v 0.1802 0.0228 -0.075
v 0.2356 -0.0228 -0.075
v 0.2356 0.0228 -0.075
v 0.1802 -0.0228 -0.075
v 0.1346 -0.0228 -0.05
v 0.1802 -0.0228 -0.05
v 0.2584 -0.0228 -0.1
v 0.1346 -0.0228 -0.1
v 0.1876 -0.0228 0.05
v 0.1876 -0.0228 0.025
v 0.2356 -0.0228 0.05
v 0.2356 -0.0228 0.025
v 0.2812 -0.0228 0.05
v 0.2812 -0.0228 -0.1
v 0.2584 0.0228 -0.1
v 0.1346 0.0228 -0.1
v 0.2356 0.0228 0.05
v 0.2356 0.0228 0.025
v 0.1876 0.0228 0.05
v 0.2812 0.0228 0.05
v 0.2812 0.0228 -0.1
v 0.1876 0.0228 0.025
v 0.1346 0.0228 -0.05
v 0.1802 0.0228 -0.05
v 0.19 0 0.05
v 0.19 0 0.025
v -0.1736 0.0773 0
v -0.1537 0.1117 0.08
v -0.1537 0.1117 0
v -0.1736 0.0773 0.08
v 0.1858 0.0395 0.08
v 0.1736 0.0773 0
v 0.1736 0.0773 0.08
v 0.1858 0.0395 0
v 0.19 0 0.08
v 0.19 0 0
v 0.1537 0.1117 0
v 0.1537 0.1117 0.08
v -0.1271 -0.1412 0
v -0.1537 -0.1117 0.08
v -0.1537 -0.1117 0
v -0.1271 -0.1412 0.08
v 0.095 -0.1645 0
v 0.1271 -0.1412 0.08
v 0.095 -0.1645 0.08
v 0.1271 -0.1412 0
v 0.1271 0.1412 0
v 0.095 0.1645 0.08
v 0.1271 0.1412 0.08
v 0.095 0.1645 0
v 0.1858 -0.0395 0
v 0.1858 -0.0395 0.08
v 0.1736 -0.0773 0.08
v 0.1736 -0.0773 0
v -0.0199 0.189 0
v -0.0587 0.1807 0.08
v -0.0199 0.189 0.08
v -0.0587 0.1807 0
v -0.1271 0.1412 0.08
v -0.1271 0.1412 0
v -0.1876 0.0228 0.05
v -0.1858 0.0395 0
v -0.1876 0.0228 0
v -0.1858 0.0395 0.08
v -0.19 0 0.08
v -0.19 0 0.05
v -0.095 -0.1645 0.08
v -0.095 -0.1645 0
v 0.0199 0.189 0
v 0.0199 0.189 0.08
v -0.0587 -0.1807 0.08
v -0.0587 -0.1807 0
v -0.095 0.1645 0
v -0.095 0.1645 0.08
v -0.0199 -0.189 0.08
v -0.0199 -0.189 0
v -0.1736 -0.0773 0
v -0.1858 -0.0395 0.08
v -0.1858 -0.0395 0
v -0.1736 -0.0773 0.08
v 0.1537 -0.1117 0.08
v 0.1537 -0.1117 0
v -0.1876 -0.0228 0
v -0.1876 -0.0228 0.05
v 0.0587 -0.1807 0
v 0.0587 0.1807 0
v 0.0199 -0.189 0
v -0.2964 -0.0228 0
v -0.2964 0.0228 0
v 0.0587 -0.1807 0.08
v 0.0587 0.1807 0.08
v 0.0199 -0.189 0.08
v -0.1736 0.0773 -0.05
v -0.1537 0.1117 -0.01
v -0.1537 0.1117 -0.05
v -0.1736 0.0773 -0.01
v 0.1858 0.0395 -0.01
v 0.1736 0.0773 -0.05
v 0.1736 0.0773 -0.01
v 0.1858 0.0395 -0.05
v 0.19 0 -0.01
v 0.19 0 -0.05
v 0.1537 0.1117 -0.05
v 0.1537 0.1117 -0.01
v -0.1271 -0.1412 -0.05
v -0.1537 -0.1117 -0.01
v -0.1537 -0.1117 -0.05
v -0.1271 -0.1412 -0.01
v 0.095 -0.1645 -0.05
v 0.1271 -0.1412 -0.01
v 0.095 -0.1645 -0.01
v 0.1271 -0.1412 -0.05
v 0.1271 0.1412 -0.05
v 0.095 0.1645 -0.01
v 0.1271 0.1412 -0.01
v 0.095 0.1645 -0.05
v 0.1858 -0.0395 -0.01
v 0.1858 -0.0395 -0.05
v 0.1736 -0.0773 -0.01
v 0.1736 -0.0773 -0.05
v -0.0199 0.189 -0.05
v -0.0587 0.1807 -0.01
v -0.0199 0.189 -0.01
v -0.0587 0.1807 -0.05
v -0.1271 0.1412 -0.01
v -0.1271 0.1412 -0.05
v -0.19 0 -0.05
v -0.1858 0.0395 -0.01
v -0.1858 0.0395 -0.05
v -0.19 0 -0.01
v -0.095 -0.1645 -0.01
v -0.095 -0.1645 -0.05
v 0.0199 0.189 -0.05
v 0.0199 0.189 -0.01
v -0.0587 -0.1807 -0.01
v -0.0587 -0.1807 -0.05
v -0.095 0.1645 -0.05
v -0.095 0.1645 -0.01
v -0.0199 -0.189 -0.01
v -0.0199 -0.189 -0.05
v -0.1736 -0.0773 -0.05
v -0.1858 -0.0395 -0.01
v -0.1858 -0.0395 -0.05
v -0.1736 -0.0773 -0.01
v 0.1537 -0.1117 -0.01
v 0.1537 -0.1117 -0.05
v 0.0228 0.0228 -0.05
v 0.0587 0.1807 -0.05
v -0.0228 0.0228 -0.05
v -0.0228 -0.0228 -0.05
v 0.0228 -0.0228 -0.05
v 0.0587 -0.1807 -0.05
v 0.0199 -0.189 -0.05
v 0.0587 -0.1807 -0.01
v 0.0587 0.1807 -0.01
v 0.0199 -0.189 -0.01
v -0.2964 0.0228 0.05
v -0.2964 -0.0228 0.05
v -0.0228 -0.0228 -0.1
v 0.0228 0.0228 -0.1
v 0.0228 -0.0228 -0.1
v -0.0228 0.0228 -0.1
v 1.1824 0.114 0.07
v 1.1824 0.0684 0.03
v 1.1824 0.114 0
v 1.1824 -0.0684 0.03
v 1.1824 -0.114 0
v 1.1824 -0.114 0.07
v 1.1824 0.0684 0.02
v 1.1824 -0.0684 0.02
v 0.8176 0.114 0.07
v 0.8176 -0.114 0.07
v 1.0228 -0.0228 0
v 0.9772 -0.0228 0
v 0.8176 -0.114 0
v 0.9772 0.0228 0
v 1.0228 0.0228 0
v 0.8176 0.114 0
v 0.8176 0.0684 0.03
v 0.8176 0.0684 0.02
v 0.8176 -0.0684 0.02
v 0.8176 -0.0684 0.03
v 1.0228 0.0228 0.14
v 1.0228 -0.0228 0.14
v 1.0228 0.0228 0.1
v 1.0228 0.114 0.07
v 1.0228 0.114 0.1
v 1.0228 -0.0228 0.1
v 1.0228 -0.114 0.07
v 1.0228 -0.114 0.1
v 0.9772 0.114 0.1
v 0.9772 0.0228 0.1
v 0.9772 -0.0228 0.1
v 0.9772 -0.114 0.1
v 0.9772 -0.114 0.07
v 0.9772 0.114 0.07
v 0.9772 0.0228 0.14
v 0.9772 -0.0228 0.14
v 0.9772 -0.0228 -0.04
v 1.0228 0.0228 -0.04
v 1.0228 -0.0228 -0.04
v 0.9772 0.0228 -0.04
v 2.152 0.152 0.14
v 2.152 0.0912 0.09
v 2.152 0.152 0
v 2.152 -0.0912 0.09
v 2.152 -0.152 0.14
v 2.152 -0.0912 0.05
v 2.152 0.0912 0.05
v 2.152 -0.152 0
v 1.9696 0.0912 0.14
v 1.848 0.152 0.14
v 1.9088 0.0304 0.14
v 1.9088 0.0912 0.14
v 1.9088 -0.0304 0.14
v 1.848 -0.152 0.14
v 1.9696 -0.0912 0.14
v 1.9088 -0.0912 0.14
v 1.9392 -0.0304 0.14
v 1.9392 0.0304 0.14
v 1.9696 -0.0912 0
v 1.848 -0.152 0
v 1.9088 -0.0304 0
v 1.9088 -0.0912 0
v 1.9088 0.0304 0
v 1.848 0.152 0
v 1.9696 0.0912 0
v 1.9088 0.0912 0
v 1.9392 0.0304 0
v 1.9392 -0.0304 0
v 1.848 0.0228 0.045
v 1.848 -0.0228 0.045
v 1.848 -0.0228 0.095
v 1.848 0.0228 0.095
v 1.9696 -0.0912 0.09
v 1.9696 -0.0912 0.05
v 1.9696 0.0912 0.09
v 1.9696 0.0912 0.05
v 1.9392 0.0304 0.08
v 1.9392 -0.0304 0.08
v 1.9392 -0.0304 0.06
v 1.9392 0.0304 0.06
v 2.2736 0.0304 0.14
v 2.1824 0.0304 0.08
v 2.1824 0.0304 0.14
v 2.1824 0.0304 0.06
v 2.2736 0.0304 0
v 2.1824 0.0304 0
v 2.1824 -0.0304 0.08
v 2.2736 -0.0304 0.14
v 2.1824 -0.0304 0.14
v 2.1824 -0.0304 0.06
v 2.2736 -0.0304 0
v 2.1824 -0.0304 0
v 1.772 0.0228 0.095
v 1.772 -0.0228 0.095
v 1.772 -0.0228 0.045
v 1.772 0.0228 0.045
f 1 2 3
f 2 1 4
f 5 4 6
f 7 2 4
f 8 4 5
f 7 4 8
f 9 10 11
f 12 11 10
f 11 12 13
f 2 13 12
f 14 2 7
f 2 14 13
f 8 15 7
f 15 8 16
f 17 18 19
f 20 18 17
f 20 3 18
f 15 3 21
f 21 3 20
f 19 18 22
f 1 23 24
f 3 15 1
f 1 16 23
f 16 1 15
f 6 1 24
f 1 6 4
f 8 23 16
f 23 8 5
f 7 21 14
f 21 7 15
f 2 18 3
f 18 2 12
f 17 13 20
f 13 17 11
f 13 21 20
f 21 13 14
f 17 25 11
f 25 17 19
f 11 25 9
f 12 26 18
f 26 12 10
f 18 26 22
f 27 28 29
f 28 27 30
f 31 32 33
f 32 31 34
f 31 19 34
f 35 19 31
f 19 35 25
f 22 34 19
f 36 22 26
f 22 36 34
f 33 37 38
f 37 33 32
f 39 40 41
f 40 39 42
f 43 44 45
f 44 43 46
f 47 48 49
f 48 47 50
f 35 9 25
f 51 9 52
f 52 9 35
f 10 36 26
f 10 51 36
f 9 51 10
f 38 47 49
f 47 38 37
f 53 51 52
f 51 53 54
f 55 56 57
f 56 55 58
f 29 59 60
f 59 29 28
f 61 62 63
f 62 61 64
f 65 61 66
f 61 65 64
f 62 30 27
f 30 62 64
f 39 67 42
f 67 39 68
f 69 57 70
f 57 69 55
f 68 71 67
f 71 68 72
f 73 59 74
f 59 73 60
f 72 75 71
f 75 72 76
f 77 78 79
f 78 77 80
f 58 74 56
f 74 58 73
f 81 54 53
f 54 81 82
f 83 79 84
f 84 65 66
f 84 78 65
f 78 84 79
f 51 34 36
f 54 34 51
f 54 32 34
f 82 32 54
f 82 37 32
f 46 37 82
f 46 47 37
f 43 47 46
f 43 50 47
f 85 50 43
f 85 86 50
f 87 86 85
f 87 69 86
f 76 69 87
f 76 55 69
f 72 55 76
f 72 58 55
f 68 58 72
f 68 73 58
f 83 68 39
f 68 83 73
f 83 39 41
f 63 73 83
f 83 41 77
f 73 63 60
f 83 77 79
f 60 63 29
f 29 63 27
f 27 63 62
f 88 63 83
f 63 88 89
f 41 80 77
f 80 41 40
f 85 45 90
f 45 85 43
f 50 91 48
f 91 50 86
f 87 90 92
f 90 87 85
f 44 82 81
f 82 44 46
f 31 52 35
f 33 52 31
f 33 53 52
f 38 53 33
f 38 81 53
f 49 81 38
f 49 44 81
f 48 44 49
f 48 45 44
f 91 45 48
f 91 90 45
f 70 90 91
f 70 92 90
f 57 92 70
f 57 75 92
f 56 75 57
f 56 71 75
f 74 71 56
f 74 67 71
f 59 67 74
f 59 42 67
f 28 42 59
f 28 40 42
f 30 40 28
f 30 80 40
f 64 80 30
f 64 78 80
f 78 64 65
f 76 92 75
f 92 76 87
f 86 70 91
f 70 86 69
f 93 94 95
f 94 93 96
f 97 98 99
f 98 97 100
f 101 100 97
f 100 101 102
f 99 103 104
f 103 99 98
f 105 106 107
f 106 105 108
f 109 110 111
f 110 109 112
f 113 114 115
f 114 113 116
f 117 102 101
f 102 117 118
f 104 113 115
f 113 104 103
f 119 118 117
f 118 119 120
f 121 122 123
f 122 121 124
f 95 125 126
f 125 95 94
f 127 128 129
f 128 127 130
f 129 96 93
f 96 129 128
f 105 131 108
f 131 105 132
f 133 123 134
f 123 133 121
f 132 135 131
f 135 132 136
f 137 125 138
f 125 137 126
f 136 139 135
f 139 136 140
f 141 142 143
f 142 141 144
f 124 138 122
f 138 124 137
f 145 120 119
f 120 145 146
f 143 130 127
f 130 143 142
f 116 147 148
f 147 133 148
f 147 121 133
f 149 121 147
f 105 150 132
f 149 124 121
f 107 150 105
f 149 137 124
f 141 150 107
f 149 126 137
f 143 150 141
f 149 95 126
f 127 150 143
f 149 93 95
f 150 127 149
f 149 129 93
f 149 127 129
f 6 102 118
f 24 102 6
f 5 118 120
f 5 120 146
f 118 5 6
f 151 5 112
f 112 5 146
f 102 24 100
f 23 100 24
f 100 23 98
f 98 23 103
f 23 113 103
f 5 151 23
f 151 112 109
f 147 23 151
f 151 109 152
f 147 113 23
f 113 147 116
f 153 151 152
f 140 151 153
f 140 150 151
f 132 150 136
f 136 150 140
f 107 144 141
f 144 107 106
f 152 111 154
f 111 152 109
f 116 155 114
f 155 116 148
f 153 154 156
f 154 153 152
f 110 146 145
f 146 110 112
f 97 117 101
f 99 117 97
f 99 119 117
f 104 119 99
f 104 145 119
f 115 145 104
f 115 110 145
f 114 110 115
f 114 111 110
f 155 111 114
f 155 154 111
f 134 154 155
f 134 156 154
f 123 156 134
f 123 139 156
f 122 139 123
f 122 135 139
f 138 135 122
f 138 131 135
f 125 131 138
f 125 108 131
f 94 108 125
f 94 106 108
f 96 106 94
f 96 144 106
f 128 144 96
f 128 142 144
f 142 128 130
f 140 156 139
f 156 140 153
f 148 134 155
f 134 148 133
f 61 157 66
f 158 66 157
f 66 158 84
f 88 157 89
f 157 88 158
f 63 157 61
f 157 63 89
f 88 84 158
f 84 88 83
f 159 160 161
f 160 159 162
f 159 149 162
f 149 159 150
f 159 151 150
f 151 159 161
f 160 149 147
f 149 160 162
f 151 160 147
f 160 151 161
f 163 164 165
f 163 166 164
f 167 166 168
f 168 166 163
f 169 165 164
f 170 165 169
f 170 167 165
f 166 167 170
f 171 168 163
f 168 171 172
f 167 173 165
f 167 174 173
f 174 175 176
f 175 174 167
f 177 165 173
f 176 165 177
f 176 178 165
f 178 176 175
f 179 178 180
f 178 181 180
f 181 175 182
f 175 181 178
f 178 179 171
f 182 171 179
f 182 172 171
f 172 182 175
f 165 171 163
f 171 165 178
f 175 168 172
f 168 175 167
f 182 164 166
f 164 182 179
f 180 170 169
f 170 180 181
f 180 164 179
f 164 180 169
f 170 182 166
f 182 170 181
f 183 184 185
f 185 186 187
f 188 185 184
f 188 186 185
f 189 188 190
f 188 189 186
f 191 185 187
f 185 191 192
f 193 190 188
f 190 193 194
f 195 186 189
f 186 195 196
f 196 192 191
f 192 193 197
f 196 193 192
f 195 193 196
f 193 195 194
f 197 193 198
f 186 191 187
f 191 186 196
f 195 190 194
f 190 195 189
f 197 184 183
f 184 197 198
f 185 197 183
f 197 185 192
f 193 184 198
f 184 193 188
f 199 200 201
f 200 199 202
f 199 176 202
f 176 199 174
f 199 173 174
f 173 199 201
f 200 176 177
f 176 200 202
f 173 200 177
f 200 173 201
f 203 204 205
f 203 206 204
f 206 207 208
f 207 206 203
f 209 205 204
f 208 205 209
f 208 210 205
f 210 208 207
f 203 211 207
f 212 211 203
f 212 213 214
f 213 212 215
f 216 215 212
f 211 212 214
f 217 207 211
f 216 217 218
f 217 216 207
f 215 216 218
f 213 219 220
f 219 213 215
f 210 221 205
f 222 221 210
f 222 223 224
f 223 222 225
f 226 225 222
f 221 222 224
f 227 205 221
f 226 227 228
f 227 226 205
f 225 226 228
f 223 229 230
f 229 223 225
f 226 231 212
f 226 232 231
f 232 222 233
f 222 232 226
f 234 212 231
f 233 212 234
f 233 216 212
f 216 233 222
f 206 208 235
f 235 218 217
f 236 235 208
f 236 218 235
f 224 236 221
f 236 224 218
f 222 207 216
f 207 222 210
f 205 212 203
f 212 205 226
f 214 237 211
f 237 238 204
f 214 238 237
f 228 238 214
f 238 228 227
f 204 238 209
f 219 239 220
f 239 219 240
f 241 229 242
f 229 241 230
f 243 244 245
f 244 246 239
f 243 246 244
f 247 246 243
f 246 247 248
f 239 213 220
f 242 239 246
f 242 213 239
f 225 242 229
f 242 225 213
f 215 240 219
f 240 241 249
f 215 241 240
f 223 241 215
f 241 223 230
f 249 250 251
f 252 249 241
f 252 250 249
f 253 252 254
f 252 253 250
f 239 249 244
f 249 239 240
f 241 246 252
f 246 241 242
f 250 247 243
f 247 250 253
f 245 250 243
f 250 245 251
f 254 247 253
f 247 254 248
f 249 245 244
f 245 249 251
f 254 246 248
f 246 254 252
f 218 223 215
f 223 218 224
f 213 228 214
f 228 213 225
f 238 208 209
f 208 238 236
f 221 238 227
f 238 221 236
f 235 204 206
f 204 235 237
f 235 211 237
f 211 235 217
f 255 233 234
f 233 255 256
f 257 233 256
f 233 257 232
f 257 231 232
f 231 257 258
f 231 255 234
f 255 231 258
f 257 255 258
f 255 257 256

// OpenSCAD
$fa = 1;
$fs = 0.04;

layer = 0.010;
px = 0.0076;

channel_width_thick = 20 * px;
channel_height_thick = 15 * layer;
channel_width_default = 6*px;
channel_height_default = 5*layer;

module xchan(l, w = channel_width_default, h = channel_height_default) {
    color("lightblue")
    if (l < 0)
        mirror([1, 0, 0])
    translate([0, -floor(w / px / 2) * px, 0]) cube([-l, w, h]);
    else
    translate([0, -floor(w / px / 2) * px, 0]) cube([l, w, h]);
}

module ychan(l, w = channel_width_default, h = channel_height_default) {
    color("lightblue")
    if (l < 0)
        mirror([0, -1, 0])
    translate([-floor(w / px / 2) * px, 0, 0]) cube([w, -l, h]);
    else
    translate([-floor(w / px / 2) * px, 0, 0]) cube([w, l, h]);
}

module zchan(l, xy = channel_width_default) {
    color("lightblue")
    translate([-xy / 2, -xy / 2, 0]) {
        if (l < 0)
            mirror([0, 0, 1])
        cube([xy, xy, -l]);
        else
        cube([xy, xy, l]);
    }
}

module 1way_valve_membrane(
    input_channel_length=15*px,
    top_chamber_h=8*layer,
    bottom_chamber_h= 4*layer,
    membrane_diameter=50*px,
    membrane_thickness=layer,
    u_channel_length=10*px,
    u_channel_height=15*layer,
    angle_offset_u_channel=0,
    angle_offset_input_channel=0
    ){
    // Top chamber
    cylinder(h=top_chamber_h, d=membrane_diameter);

    // Bottom chamber
    translate([0, 0, -(membrane_thickness+bottom_chamber_h)])
        cylinder(h=bottom_chamber_h, d=membrane_diameter);

    // Input channel
    color("red")
    rotate([0, 0, angle_offset_input_channel])
    translate([-(input_channel_length + membrane_diameter/2) + px, 0, 0])
        xchan(input_channel_length);

    // U channel
    rotate([0, 0, angle_offset_u_channel])
    translate([membrane_diameter/2 - px, 0, channel_height_default/2]){
        xchan(u_channel_length, h=channel_height_default/2);
        translate([u_channel_length, 0, channel_height_default/2]){
            zchan(-u_channel_height);
            translate([0, 0, -u_channel_height]){
                xchan(-u_channel_length -px, h=channel_height_default/2);
                translate([-u_channel_length - channel_height_default/2, 0, 0]){
                    zchan(u_channel_height-(bottom_chamber_h + membrane_thickness + channel_height_default/2));
                }
            }
        }
    }

    // Output channel
    color("green")
    translate([0, 0, -(membrane_thickness + bottom_chamber_h)]){
        zchan(-5*layer);
    }
}

module 1way_valve_ribbon(
    membrane_width=18*px,
    membrane_thickness=layer,
    membrane_top_gap=4*layer,
    membrane_bottom_gap=2*layer,
    membrane_side_gap=6*px,
    main_chamber_x=48*px,
    inlet_x=6*px,
    inlet_z=3*layer
    ){
    main_chamber_y = membrane_width+2*membrane_side_gap;
    main_chamber_z = membrane_top_gap + membrane_thickness + membrane_bottom_gap;
    translate([-main_chamber_x/2, -main_chamber_y/2, 0]){
        difference(){
            // Main chamber
            cube([main_chamber_x, main_chamber_y, main_chamber_z]);

            // Ribbon membrane
            translate([0, membrane_side_gap, membrane_bottom_gap])
                cube([main_chamber_x, membrane_width, membrane_thickness]);
        }
        // Top thick outlet
        translate([0.5*(main_chamber_x-inlet_x), 0, main_chamber_z]){
            cube([inlet_x, main_chamber_y, inlet_z]);
            color("red")
            translate([inlet_x/2, main_chamber_y/2, inlet_z])
                zchan(4*layer);
        }
        // Bottom narrow inlet
        color("green")
        translate([main_chamber_x/2, main_chamber_y/2, 0])
            zchan(-4*layer);
    }
}

module 1way_valve_squeeze(
    length=24*px,
    height=14*layer
    ){
    ch_w = 8*px;
    ch_wtwo = 10*px;

    wall_w = 8*px;
    mem_h = layer;
    squeeze = 2*layer;
    squeezer = (height-2*mem_h-squeeze)/2;

    translate([-(length+ch_w+wall_w)/2, -(3*ch_w+2*wall_w)/2 , 0]){
        cube([length+ch_w+wall_w,ch_w,height]);
        translate([0,2*ch_w+2*wall_w])
        cube([length+ch_w+wall_w,ch_w,height]);
        translate([0,ch_w+wall_w])
        cube([ch_w+wall_w/2,ch_w,height]);
        translate([0,ch_w+wall_w,squeezer+mem_h])
        cube([length+ch_w+2.5*wall_w,ch_w,squeeze]);
        color("green")
        translate([length+ch_w+1.5*wall_w,ch_w+wall_w])
        cube([ch_w+wall_w/2,ch_w,height]);
        
        
        cube([ch_w,3*ch_w+2*wall_w,height]);
        translate([ch_w+wall_w,0,0])
        cube([length,3*ch_w+2*wall_w,squeezer]);
        translate([ch_w+wall_w,0,squeezer+squeeze+2*mem_h])
        cube([length,3*ch_w+2*wall_w,squeezer]);

        // Outlet channel
        color("red")
        translate([0, (3*ch_w+2*wall_w)/2, height/2 - channel_height_default/2])
            xchan(-10*px);
    }
}

1way_valve_membrane();

translate([1, 0, 0])
1way_valve_ribbon();

translate([2, 0, 0])
1way_valve_squeeze();
